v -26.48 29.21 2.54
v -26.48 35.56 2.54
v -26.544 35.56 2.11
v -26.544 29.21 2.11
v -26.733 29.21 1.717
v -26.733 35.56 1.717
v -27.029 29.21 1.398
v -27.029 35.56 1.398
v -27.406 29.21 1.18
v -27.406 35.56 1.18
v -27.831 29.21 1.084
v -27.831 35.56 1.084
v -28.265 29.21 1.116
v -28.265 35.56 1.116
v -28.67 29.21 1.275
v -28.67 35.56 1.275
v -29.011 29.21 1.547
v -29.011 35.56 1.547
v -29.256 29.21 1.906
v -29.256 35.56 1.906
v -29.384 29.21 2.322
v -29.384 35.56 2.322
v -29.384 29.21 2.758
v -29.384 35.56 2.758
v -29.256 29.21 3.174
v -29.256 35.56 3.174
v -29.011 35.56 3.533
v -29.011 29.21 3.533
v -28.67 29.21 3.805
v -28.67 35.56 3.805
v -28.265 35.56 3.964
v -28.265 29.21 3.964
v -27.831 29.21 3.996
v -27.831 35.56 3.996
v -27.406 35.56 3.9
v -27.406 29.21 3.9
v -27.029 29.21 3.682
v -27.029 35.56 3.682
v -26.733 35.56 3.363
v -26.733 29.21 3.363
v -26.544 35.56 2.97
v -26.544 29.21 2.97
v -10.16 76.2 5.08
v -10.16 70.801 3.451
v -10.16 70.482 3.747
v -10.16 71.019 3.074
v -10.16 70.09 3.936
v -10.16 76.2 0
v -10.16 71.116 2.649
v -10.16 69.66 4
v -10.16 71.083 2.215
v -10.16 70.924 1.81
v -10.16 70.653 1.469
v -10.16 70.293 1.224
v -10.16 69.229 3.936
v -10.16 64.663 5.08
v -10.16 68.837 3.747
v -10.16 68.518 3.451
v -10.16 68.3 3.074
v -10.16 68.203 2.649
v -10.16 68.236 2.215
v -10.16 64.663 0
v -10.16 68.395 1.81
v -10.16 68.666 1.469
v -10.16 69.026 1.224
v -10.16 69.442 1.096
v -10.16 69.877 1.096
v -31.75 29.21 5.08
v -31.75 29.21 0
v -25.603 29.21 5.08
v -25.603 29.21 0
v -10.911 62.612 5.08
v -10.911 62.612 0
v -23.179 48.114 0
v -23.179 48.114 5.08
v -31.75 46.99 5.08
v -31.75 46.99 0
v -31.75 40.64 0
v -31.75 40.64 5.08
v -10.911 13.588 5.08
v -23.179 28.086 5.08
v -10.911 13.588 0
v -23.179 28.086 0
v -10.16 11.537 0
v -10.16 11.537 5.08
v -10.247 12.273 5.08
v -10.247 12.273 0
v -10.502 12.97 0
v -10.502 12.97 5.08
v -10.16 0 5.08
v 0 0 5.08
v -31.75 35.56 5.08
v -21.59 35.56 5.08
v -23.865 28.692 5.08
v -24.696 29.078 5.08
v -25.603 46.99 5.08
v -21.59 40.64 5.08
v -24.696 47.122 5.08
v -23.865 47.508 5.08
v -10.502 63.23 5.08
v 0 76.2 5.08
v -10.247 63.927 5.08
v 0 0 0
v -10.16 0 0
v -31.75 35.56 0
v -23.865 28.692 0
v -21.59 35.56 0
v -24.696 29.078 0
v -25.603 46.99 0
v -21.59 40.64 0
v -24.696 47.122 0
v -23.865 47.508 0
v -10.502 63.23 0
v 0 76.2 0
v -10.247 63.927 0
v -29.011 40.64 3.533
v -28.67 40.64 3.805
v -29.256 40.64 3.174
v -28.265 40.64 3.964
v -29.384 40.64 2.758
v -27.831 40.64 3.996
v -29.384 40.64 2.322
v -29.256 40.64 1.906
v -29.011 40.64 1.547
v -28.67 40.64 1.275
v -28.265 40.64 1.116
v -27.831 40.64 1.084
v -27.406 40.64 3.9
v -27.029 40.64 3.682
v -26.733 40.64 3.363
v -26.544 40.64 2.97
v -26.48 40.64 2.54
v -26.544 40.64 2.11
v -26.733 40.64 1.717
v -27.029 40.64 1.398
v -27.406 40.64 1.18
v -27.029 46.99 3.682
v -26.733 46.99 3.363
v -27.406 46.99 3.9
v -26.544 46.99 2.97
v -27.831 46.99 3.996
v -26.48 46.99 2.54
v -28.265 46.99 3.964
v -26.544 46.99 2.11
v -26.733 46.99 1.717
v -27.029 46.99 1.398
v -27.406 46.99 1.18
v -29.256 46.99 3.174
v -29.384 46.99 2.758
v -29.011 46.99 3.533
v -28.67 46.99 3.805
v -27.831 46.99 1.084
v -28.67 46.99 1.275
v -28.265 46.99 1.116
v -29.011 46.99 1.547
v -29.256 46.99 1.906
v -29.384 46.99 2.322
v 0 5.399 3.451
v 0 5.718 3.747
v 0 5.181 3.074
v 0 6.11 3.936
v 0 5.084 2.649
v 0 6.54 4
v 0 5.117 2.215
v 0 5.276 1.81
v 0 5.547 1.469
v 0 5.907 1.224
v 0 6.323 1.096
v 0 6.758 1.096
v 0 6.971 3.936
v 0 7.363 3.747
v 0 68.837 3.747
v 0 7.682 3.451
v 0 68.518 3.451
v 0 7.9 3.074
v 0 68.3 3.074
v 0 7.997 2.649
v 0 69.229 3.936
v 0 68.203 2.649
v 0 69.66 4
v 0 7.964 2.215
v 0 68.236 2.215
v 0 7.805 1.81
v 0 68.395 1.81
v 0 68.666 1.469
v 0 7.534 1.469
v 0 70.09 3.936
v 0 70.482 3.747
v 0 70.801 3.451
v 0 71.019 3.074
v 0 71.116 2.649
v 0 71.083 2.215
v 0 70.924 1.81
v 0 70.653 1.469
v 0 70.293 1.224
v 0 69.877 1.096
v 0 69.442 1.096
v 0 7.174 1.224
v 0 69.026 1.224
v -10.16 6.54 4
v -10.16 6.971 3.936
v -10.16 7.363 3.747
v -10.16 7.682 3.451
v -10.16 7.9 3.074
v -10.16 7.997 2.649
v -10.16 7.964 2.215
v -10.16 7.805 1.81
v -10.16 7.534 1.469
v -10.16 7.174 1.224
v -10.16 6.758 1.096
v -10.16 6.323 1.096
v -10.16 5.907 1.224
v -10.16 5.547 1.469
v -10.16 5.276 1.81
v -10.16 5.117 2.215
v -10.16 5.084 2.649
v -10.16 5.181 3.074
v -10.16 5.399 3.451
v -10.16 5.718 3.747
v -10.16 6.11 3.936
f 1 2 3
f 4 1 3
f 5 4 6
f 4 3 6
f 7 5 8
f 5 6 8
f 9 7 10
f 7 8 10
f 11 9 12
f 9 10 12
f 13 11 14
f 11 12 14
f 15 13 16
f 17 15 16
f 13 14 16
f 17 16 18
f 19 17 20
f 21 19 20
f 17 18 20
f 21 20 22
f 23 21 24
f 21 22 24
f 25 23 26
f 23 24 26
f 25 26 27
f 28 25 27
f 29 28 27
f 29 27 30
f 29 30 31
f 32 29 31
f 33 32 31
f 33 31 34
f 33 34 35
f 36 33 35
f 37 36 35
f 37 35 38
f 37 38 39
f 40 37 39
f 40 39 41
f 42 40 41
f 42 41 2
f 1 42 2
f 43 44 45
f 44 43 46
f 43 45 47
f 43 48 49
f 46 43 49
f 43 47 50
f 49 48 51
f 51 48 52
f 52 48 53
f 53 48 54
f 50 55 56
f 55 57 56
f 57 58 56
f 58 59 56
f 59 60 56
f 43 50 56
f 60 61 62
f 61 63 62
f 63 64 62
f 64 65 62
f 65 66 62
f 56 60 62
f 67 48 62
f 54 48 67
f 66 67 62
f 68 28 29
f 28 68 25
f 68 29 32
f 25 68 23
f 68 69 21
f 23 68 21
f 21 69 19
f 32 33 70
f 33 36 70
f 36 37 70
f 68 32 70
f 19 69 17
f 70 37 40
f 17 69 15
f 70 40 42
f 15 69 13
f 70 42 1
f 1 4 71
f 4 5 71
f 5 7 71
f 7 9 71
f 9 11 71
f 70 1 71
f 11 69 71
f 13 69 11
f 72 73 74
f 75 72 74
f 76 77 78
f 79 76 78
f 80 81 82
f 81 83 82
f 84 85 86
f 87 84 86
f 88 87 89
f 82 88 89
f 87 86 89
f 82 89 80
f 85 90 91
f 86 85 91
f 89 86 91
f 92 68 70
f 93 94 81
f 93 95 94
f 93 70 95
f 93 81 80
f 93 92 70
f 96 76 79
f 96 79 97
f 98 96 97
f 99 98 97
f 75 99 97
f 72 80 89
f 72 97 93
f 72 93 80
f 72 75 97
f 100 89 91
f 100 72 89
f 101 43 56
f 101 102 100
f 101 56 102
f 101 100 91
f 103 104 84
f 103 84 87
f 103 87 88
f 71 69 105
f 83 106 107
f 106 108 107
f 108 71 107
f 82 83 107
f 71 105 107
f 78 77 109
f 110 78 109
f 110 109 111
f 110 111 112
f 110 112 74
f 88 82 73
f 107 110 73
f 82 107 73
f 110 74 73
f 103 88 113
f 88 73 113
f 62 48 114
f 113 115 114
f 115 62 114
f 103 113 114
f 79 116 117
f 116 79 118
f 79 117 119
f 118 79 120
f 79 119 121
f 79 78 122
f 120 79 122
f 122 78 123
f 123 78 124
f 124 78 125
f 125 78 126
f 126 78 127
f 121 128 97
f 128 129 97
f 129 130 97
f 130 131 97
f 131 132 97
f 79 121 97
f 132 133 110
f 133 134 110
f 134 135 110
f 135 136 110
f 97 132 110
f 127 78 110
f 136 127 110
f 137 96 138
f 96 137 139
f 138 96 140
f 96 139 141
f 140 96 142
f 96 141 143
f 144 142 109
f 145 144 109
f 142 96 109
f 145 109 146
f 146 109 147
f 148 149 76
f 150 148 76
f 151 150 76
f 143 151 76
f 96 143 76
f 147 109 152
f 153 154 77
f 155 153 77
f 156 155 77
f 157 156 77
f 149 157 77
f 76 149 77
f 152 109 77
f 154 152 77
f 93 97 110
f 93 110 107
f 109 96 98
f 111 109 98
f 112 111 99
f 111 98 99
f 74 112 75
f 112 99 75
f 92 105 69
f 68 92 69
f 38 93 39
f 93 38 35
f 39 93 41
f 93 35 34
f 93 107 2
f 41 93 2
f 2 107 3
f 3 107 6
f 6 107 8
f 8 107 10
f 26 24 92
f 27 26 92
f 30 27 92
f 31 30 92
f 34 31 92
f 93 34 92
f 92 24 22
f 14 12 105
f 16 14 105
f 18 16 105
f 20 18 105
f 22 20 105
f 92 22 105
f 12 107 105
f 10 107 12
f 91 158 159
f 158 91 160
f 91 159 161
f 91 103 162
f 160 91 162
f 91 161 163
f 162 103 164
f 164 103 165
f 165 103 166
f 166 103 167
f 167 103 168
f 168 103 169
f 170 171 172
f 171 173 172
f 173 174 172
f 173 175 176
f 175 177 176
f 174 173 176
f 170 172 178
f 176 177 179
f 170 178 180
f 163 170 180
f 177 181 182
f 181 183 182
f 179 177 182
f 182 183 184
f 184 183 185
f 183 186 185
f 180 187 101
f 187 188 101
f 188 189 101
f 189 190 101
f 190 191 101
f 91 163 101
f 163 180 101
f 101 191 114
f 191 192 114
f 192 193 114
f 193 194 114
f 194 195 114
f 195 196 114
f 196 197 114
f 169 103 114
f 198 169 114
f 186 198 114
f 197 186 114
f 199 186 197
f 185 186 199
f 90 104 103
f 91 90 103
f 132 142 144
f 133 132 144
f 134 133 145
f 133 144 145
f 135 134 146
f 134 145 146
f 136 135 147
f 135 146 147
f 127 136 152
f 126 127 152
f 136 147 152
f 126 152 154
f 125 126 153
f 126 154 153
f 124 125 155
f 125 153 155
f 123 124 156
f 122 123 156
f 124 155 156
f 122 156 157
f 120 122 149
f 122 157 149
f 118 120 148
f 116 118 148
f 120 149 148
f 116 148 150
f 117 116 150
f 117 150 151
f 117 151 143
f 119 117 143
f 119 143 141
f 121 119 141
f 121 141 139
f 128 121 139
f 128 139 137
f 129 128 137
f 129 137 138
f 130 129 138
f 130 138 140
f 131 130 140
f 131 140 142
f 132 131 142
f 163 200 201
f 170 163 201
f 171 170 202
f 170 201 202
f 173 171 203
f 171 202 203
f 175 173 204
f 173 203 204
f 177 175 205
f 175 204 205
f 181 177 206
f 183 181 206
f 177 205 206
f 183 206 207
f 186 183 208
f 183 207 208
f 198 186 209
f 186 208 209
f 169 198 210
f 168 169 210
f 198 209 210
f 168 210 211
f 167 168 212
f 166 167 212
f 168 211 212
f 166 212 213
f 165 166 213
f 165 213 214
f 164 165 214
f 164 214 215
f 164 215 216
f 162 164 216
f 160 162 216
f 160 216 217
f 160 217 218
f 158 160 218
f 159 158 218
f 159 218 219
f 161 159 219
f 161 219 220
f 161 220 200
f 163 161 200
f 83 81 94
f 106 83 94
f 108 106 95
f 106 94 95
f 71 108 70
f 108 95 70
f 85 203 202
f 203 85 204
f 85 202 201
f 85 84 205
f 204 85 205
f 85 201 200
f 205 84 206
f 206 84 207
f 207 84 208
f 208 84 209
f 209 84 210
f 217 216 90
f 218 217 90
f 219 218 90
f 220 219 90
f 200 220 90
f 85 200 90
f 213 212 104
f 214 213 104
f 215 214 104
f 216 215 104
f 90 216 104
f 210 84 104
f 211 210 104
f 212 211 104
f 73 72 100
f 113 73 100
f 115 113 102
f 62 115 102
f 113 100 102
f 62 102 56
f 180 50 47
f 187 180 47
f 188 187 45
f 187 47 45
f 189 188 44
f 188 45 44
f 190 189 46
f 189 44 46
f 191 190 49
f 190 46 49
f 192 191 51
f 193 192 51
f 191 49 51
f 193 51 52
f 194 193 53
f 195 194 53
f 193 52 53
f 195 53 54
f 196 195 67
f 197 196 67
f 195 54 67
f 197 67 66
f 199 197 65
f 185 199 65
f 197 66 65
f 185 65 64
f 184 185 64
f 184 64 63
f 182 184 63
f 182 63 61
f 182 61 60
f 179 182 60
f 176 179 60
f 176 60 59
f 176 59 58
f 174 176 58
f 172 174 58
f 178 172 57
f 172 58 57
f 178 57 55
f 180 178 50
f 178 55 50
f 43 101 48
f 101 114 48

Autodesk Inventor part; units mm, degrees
ref_plane "YZ Plane" through (0, 0, 0) normal (1, 0, 0) x (0, 1, 0)
ref_plane "XZ Plane" through (0, 0, 0) normal (0, 1, 0) x (-1, 0, 0)
sketch "Sketch1" plane through (0, 0, 0) normal (0, 0, 1) x (1, 0, 0)
  line L0 (0, 0) -> (0, 76.2)
  line L1 (0, 76.2) -> (-10.16, 76.2)
  line L2 (-10.16, 76.2) -> (-10.16, 63.5)
  line L3 (-10.16, 63.5) -> (-24.13, 46.99)
  line L4 (-24.13, 46.99) -> (-31.75, 46.99)
  line L5 (-31.75, 46.99) -> (-31.75, 40.64)
  line L6 (-21.59, 35.56) -> (-31.75, 35.56)
  line L7 (-31.75, 35.56) -> (-31.75, 29.21)
  line L8 (-31.75, 29.21) -> (-24.13, 29.21)
  line L9 (-24.13, 29.21) -> (-10.16, 12.7)
  line L10 (-10.16, 12.7) -> (-10.16, 0)
  line L11 (-10.16, 0) -> (0, 0)
  line L12 (-31.75, 40.64) -> (-21.59, 40.64)
  line L13 (-21.59, 40.64) -> (-21.59, 35.56)
  line L14 (-21.59, 38.1) -> (-22.098, 38.1) construction
  dimension "d1" = 10.16
  dimension "d2" = 31.75
  dimension "d3" = 76.2
  dimension "d5" = 7.62
  dimension "d8" = 5.08
  dimension "d11" = 38.1
  dimension "d12" = 6.35
  dimension "d14" = 12.7
  dimension "d23" = 10.16
extrude "Extrusion1" add sketch "Sketch1" along normal blind 5.08
fillet "Fillet1" radius 3.175 4 edges at (-10.16, 12.7, 2.54) (-24.13, 29.21, 2.54) (-10.16, 63.5, 2.54) (-24.13, 46.99, 2.54)
sketch "Sketch2" plane through (0, 0, 5.08) normal (0, 0, 1) x (1, 0, 0)
  line L0 (-10.16, 11.537) -> (-10.16, 0) projected
  line L1 (-10.16, 0) -> (0, 0) projected
  line L2 (0, 0) -> (0, 76.2) projected
  line L3 (0, 76.2) -> (-10.16, 76.2) projected
  line L4 (-10.16, 76.2) -> (-10.16, 64.663) projected
  line L5 (-10.9112, 62.6122) -> (-23.1788, 48.1141) projected
  line L6 (-25.6026, 46.99) -> (-31.75, 46.99) projected
  line L7 (-31.75, 46.99) -> (-31.75, 40.64) projected
  line L8 (-31.75, 40.64) -> (-21.59, 40.64) projected
  line L9 (-21.59, 40.64) -> (-21.59, 35.56) projected
  line L10 (-21.59, 35.56) -> (-31.75, 35.56) projected
  line L11 (-31.75, 35.56) -> (-31.75, 29.21) projected
  line L12 (-31.75, 29.21) -> (-25.6026, 29.21) projected
  line L13 (-23.1788, 28.0859) -> (-10.9112, 13.5878) projected
  line L14 (-24.13, 46.99) -> (-31.75, 46.99) construction
  line L15 (-27.94, 46.99) -> (-27.94, 40.64) construction
  line L16 (-31.75, 40.64) -> (-21.59, 40.64) construction
  line L17 (-29.4005, 46.99) -> (-29.4005, 40.64)
  line L18 (-26.4795, 46.99) -> (-26.4795, 40.64)
  line L19 (0, 0) -> (0, 76.2) construction
  line L20 (0, 38.1) -> (-22.098, 38.1) construction
  line L21 (-29.4005, 29.21) -> (-29.4005, 35.56)
  line L22 (-26.4795, 29.21) -> (-26.4795, 35.56)
  line L23 (-10.16, 12.7) -> (-10.16, 0) projected
  line L24 (-10.16, 5.08) -> (0, 5.08)
  line L25 (-10.16, 8.001) -> (0, 8.001)
  line L26 (-10.16, 71.12) -> (0, 71.12)
  line L27 (-10.16, 68.199) -> (0, 68.199)
  arc A0 (-23.1788, 28.0859) -> (-25.6026, 29.21) centre (-25.6026, 26.035) ccw projected
  arc A1 (-10.16, 11.537) -> (-10.9112, 13.5878) centre (-13.335, 11.537) ccw projected
  arc A2 (-10.9112, 62.6122) -> (-10.16, 64.663) centre (-13.335, 64.663) ccw projected
  arc A3 (-25.6026, 46.99) -> (-23.1788, 48.1141) centre (-25.6026, 50.165) ccw projected
  dimension "d18" = 1.4605
  dimension "d19" = 1.4605
  dimension "d21" = 2.921
  dimension "d22" = 5.08
sketch "Sketch3" plane through (-31.75, 46.99, 0) normal (0, 1, 0) x (1, 0, 0)
  line L0 (3.81, -5.08) -> (3.81, 0) construction
  circle A0 centre (3.81, -2.54) radius 1.4605
  point P0 (31.75, 0)
  dimension "d24" = 2.921
extrude "Extrusion2" cut sketch "Sketch3" against normal blind 25.4
sketch "Sketch4" plane through (-10.16, 0, 0) normal (-1, 0, 0) x (0, 0, 1)
  line L0 (0, 0) -> (0, 76.2) construction
  line L1 (0, 12.7) -> (0, 0) construction
  line L2 (0, 6.5405) -> (5.08, 6.5405) construction
  line L3 (0, 0) -> (5.08, 0) construction
  circle A0 centre (2.54, 6.5405) radius 1.4605
  point P0 (5.08, 5.08)
  dimension "d27" = 6.5405
  dimension "d28" = 2.921
extrude "Extrusion3" cut sketch "Sketch4" against normal blind 25.4
ref_plane "Work Plane1" through (0, 38.1, 5.08) normal (0, 1, 0) x (-1, 0, 0)
mirror "Mirror1" about plane through (0, 38.1, 5.08) normal (0, 1, 0) of "Extrusion3"
equation "\"d19\" = d18"
properties part number "mount 3D print"
